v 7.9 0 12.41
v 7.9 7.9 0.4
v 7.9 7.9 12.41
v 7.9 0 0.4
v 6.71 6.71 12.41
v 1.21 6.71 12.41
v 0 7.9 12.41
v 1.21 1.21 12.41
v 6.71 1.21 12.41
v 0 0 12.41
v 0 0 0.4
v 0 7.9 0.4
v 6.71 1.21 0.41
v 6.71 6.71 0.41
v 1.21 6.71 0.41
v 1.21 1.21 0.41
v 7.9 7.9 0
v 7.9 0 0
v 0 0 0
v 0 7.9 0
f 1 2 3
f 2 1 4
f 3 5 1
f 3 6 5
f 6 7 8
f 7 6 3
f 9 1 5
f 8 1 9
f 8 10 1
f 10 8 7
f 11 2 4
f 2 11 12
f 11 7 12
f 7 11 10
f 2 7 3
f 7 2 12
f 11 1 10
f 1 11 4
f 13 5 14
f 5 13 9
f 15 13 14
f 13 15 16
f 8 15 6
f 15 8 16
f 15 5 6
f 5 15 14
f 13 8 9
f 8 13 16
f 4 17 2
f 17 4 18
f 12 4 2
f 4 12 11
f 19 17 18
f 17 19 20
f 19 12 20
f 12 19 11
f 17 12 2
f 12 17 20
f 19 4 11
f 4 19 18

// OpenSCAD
// file: ../../Base/Rotation.scad
// Fischertechnik Box Foundation
// Geometry Helpers Rotation

include <PlacementOptions.scad>

// getRotatedSpace(space, rotation=NoRotation)
// Rotates the space dependent on the specified rotation

function getRotatedSpace(space, rotation=NoRotation) = [
    (rotation == Rotate90 || rotation == Rotate270) ? space.y : space.x,
    (rotation == Rotate90 || rotation == Rotate270) ? space.x : space.y
];

// Rotates the given space around the fixed left lower corner
// space = the space the children needs as width/depth list [width,depth]
// rotation = 0 Rotate0 degrees, 1 Rotate90 degrees, 2 Rotate180 degrees, 3 Rotate270 degrees (equivalent to -90)

module RotateFix(space, rotation=NoRotation) {
    dy = (rotation == Rotate0 || rotation == Rotate270) ? 0 :
        (rotation == Rotate90) ? space.x :
        space.y;
    dx = (rotation < Rotate180) ? 0 :
        (rotation == Rotate180) ? space.x :
        space.y;
    
    translate([dx, dy, 0])
        rotate([0, 0, rotations[rotation]])
            children();
}
// file: ../../Base/Alignment.scad
// Fischertechnik Box Foundation
// Geometry Helpers Alignment

include <PlacementOptions.scad>

// getAlignedX(elementWidth, spaceWidth, align=AlignRight, offset=0)
// Gets the aligned X offset of an element with the given
// width in the given space.
// elementWidth = The width of the element to positon
// spaceWidth = The space where the element should be aligned
// align = 0 AlignLeft, 1 AlignCenter, 2 AlignRight
// offset = an optional offset from the aligned position. When
// aligned left or centered, then positive values are in X direction.
// When aligned right then positive values are in negative X direction.

function getAlignedX(elementWidth, spaceWidth, align=AlignRight, offset=0) =
    (align == AlignLeft) ?
        offset :
        ((align == AlignCenter) ?
        (spaceWidth - elementWidth)/2 + offset :
        spaceWidth - offset - elementWidth);

// getAlignedY(elementDepth, spaceDepth, align=AlignTop, offset=0)
// Gets the aligned Y offset of an element with the given
// depth in the given space.
// elementDepth = The depth of the element to positon
// spaceDepth = The space where the element should be aligned
// align = 0 AlignBottom, 1 AlignCenter, 2 AlignTop
// offset = an optional offset from the aligned position. When
// aligned bottom or centered, then positive values are in Y direction.
// When aligned top then positive values are in negative Y direction.

function getAlignedY(elementDepth, spaceDepth, align=AlignTop, offset=0) =
    (align == AlignBottom) ?
        offset :
        ((align == AlignCenter) ?
        (spaceDepth - elementDepth)/2 + offset :
        spaceDepth - offset - elementDepth);
// file: ../../Base/PlacementOptions.scad
// Fischertechnik Box Foundation
// Placement Options

// Alignment
NoAlign = 0;
AlignLeft = 1;
AlignBottom = 2;
AlignCenter = 3;
AlignRight = 4;
AlignTop = 5;

// Element rotation degree steps
rotations = [0, -90, -180, -270];

// Rotation
NoRotation = 0;
Rotate0 = 0;
Rotate90 = 1;
Rotate180 = 2;
Rotate270 = 3;

// Docking (seen from above)
NoDock = -1;
DockLeft = 0;
DockTop = 1;
DockRight = 2;
DockCorner = 2;
DockBottom = 3;

// Web corners
LowerLeft = 0;
UpperLeft = 1;
UpperRight = 2;
LowerRight = 3;

// Web position relative to corner
LeftOfCorner = 0;
RightOfCorner = 1;
// file: ../../Base/Boxes.scad
// Fischertechnik Box Foundation
// Pre-designed Boxes

use <Constants.scad>

include <PlacementOptions.scad>

box190Width = 190;
box190Depth = 130;
box130Width = 130;
box130Depth = 95;

// Values are from an original ec3 box
topBottomDifference = 1.5;
outerHeight = 40;
innerHeight = 38.2;
baseThickness = outerHeight - innerHeight;
stackExcess = 5.7;
radius = 3.5;
wallThickness = 1.5;
tolerance = 0.2;
stackOffset = innerHeight - stackExcess;

boxUsageHeight = stackOffset;
boxWallThickness = wallThickness;
boxBaseThickness = baseThickness;
boxWebWidth = 3.0;

// getBoxWallThickness()
// Gets the wall thickness of a Fischertechnik Box
function getBoxWallThickness() = boxWallThickness;

// getBoxUsageHeight()
// Gets the usable height of a Fischertechnik box
function getBoxUsageHeight() = boxUsageHeight;

// getBoxInnerHeight()
// Gets the inner height of a Fischertechnik box, including the stack excess
function getBoxInnerHeight() = innerHeight;

// getBoxBaseThickness()
// Gets the thickness of the Fischertechnik box base.
function getBoxBaseThickness() = boxBaseThickness;

// getBoxWebWidth()
// Gets the width of a box web
function getBoxWebWidth() = boxWebWidth;

// getBox190Space()
// Gets the usable inner space of a Box 190 as an x/y-list
function getBox190Space() = [
    box190Width - 2*getBoxWallThickness() - topBottomDifference, 
    box190Depth - 2*getBoxWallThickness() - topBottomDifference ];

// BoxBase(width, depth)
// Creates an empty stackable Fischertechnik compatible box
// width = Outer width of the box (190, 130, ...)
// depth = Outer depth of the box (130, 95, ...)

module BoxBase(width, depth, height=outerHeight) {    
    thinPlate = 0.01;

    innerHeight = height - baseThickness;    
    
    module BodyPlate(width, depth) {
        translate([radius, radius])
        hull() {
            w = width-2*radius;
            d = depth-2*radius;
            cube([w, d, thinPlate]);
            cylinder(thinPlate, r=radius, $fn=getFragments());
            translate([w, 0])
                cylinder(thinPlate, r=radius, $fn=getFragments());
            translate([w, d])
                cylinder(thinPlate, r=radius, $fn=getFragments());
            translate([0, d])
                cylinder(thinPlate, r=radius, $fn=getFragments());
        }
    }
    
    module Body(tolerance=tolerance) {
        hull() {
            // Bottom with tolerance to fit into the original boxes when stacked
            translate([-wallThickness+tolerance, -wallThickness+tolerance, -baseThickness])
                BodyPlate(width-topBottomDifference-2*tolerance, depth-topBottomDifference-2*tolerance);
            
            // Top
            translate([-wallThickness-topBottomDifference/2, -wallThickness-topBottomDifference/2, innerHeight-thinPlate])
                BodyPlate(width, depth);
         }
    }

    module Cutoff() {
        hull() {
            coWidth = width - 2*wallThickness;
            coDepth = depth - 2*wallThickness;
            
            // Bottom
            BodyPlate(coWidth-topBottomDifference, coDepth-topBottomDifference);

            // Top
            translate([-topBottomDifference/2, -topBottomDifference/2, innerHeight+thinPlate]) 
                BodyPlate(coWidth, coDepth);
        }
    }
    
    difference() {        
        Body();
        Cutoff();
        stackOffset = innerHeight - stackExcess;
        translate([0, 0, stackOffset + baseThickness])
            Body(tolerance=0);
    }
}

// Creates the Fischertechnik empty box 130x190 mm and places it at position 0,0
// 190x130 are the outer sizes, the inner space is slightly smaller. Use getBox190Space() to get the inner sizes.
// The box is positioned that the usable inner space is at the 0,0,0 position. The

module Box190() {
    BoxBase(box190Width, box190Depth);
}

// Gets the usable inner space of a Box 130 as an x/y-list
function getBox130Space() = [
    box130Width - 2*getBoxWallThickness() - topBottomDifference, 
    box130Depth - 2*getBoxWallThickness() - topBottomDifference ];

// Creates the Fischertechnik empty box 95x130 mm and places it at position 0,0
// 190x130 are the outer sizes, the inner space is slightly smaller. Use getBox190Space() to get the inner sizes.
// The box is positioned that the usable inner space is at the 0,0,0 position. The

module Box130() {
    BoxBase(box130Width, box130Depth);
}

// Creates a web at the specified box walls
// corner 0 = LowerLeft, 1 = UpperLeft, 2 = UpperRight, 3 = LowerRight
// side 0 = LeftOfCorner, 1 = RightOfCorner
// distance = Distance in mm from the corner
// boxSpace = inner width and depth of the box (default: Box 190)
// webWidth = length of the web (default is 3 mms)
// webThickness = thickness of the web (default is 1 mm)

module BoxWeb(corner, side, distance, boxSpace=getBox190Space(), webWidth=getBoxWebWidth(), webThickness=1.0) {
    sink = getBoxWallThickness()/2;

    width = (corner % 2 == 0) ? 
            (side == LeftOfCorner ? webWidth : webThickness) :
            (side == LeftOfCorner ? webThickness : webWidth);

    depth = (corner % 2 == 0) ? 
            (side == RightOfCorner ? webWidth : webThickness) :
            (side == RightOfCorner ? webThickness : webWidth);
    
    xDiff = corner == LowerLeft ? 
                (side == LeftOfCorner ? -sink : distance) :
            (corner == UpperLeft ?                
                (side == LeftOfCorner ? distance : -sink) :
            (corner == UpperRight ?
                (side == LeftOfCorner ? boxSpace.x-webWidth+sink : boxSpace.x-distance-webThickness) :
                (side == LeftOfCorner ? boxSpace.x-distance-webThickness: boxSpace.x-webWidth+sink)));

    yDiff = corner == LowerLeft ? 
                (side == RightOfCorner ? -sink : distance) :
            (corner == UpperLeft ?
                (side == RightOfCorner ? boxSpace.y-distance : boxSpace.y-webWidth+sink) :
            (corner == UpperRight ?
                (side == RightOfCorner ? boxSpace.y-webWidth+sink : boxSpace.y-distance) :
                (side == RightOfCorner ? distance : -sink)));
    
    translate([xDiff, yDiff, -getExcess()])
        cube([width, depth, boxUsageHeight + 2*getExcess()]);
}
// file: ../../Base/Placement.scad
// Fischertechnik Box Foundation
// Geometry Helpers Placement

use <Constants.scad>
use <Alignment.scad>
use <Rotation.scad>
use <Boxes.scad>

include <PlacementOptions.scad>

// Place(x=0, y=0, elementSpace=[0,0], alignX=AlignLeft, alignY=AlignBottom, rotation=Rotate0, boxSpace=getBox190Space())
// Places the child at the specified position
// y = Y-Position. This is a relative position when an X aligment is specified.
// x = X-Position. This is a relative position when an Y aligment is specified.
// elementSpace = space of the element to be placed [x,y]
// alignX = -1=NoAlign, 0 AlignLeft, 1 AlignCenter, 3 AlignRight (elementSpace and boxSpace required!)
// alignY = -1=NoAlign, 2 AlignBottom, 1 AlignCenter, 4 AlignTop (elementSpace and boxSpace required!)
// rotation = 0 Rotate0 0 degrees, 1 Rotate90 90 degrees, 
// 2 Rotate180 180 degrees, 3 Rotate270 270 degrees (equivalent to -90)
// boxSpace = Inner space of the box where the placement occurs [x,y] - default is Box 190x130 inner space

module Place(x=0, y=0, elementSpace=[0,0], 
  alignX=AlignLeft, alignY=AlignBottom, 
  rotation=NoRotation, boxSpace=getBox190Space()) {

    module Position(x, y, space, rotation=Rotate0) {
        translate([x, y, 0])
            RotateFix(space, rotation)
                children();
    }

    space = getRotatedSpace(elementSpace, rotation);
    alignedX = getAlignedX(space.x, boxSpace.x, alignX, x);
    alignedY = getAlignedY(space.y, boxSpace.y, alignY, y);
    Position(alignedX, alignedY, elementSpace, rotation)
        children();
}

// Center(space=getBox130Space(), elementSpace=[0,0])
// space = Space where the children is centered. For cylinder use centered=true and no elementSpace.
// elementSpace = space of the element to be centered [x,y]

module Center(space=getBox190Space(), elementSpace=[0,0]) {
    Place(elementSpace=elementSpace, boxSpace=space, alignX=AlignCenter, alignY=AlignCenter)
        children();
}

// CenterHorizontal(width=0, y=0, offset=0, space=getBox130Space())
// width = Width of the element to be placed.
// y = Y position of the element
// offset = Offset from the center position (negative will be left of the center)
// space = Space where the element is placed

module CenterHorizontal(width=0, y=0, offset=0, space=getBox190Space()) {
    Place(x=offset, y=y, elementSpace=[width, 0], boxSpace=space, alignX=AlignCenter)
        children(0);
}

// CenterVertical(depth=0, x=0, offset=0, space=getBox130Space())
// depth = Depth of the element to be placed.
// x = X position of the element
// offset = Offset from the center position (negative will be down of the center)
// space = Space where the element is placed

module CenterVertical(depth=0, x=0, offset=0, space=getBox190Space()) {
    Place(x=x, y=offset, elementSpace=[0, depth], boxSpace=space, alignY=AlignCenter)
        children(0);
}

// getIsVertical(align)
// True if the specified alignment needs a vertical orientation for a divider (AlignRight, AlignLeft)

function getIsVertical(align) = (align == AlignRight || align == AlignLeft);

// getIsHorizontal(align)
// True if the specified alignment needs a horizontal orientation for a divider (AlignTop, AlignBottom)

function getIsHorizontal(align) = (align == AlignTop || align == AlignBottom);
// file: ../../Elements/AxisClip10.scad
// Fischertechnik Box Library
// Axis for clip 10
// 31023

use <../ModelBase/Simple.scad>
use <../Base/Constants.scad>

width = 12;
depth = 12;
height = 23;
upperDiameter = 3.6;
clipHeight = 10;

// getAxisClip10Space()
// Gets the space of a frame for a clip 10 with spring ring (mot2)

function getAxisClip10Space() = [width, depth, height];

// AxisClip10(height, clipHeight)
// Axis for clip 10 with spring ring (mot2)
// height = Height of the complete axis
// clipHeight = Height of the rt for the clip (standard is 10, in mot3 its only 7)

module AxisClip10(height=height, clipHeight=clipHeight) {
    LeveledAxisWithSpace(height, height-clipHeight, getAxisClip10Space(), diameter=upperDiameter);
}

// Tests
color("lightgray")
AxisClip10();
// file: ../../Base/Constants.scad
// Fischertechnik Box Foundation
// Constants

// Constant values necessary for multiple elements

// Base constants
dividerThickness = 1.2;
excess = 0.01;
fragments = 90;
tolerance = 0.8;

// Gets the thickness of a divider 
function getDividerThickness() = dividerThickness;

// Gets the excess that is used to merge walls into each other
function getExcess() = excess;

// Gets amount of fragments of a cylinder
function getFragments() = fragments;

// Gets the inner tolerance of a frame to each side
function getTolerance() = tolerance;


// Fischertechnik specific constants
axisDiameter = 4;
axisBottomDiameter = axisDiameter + 1;
standardEdgeDistance = 2.5;
standardWebDistance = 11.5;
standardCornerLength = 15;
tubeWallFactor = 0.8;
smallPartsFrameHeight = 20;

// Gets axis diameter
function getAxisDiameter() = axisDiameter;

// Gets axis bottom diameter for thicker part at the bottom
function getAxisBottomDiameter() = axisBottomDiameter;

// gets the standard distance to the wall of the box for dockable frames with webs
function getStandardEdgeDistance() = standardEdgeDistance;

// gets the standard distance of each web to the corner of the dockable frame
function getStandardWebDistance() = standardWebDistance;

// gets the standard length of the corner walls of a dockable frame
function getStandardCornerLength() = standardCornerLength;

// gets the wall thickness of a tube.
function getTubeWallThickness() = tubeWallFactor * getDividerThickness();

// gets the frame height for docked small parts boxes.
function getSmallPartsFrameHeight() = smallPartsFrameHeight;
// file: ../../Elements/FrameControlLight.scad
// Fischertechnik Box Library
// Frame for Control Light for electronic building block
// 36390

use <../Base/Constants.scad>
use <../ModelBase/Simple.scad>

width = 5.5;
depth = 5.5;
height = 12;

// getFrameControlLightSpace()
// Gets the space the frame for a control light needs as width and depth (.x and .y as a list)

function getFrameControlLightSpace() = getFrameOuterVolume([width, depth, height], tolerance=0);

// FrameControlLight()
// The walls of the frame are 12 mm high. 

module FrameControlLight() {
    Frame([width, depth, height], tolerance=0);
}

// Tests
color("lightgray") {
FrameControlLight();
}
// file: ../TestPrint.scad
// 3D Print Test Base

use <../Base/Constants.scad>

use <../Elements/AxisClip10.scad>

module TestPrint(elementSpace) {
    cube([elementSpace.x, elementSpace.y, 0.4]);
    translate([0,0,0.4+getExcess()]) {
        children();
    }
}

TestPrint(getAxisClip10Space())
    AxisClip10();
// main file
// 3D Print Test
// FrameControlLight

use <../TestPrint.scad>
use <../../Elements/FrameControlLight.scad>

TestPrint(getFrameControlLightSpace())
    FrameControlLight();
